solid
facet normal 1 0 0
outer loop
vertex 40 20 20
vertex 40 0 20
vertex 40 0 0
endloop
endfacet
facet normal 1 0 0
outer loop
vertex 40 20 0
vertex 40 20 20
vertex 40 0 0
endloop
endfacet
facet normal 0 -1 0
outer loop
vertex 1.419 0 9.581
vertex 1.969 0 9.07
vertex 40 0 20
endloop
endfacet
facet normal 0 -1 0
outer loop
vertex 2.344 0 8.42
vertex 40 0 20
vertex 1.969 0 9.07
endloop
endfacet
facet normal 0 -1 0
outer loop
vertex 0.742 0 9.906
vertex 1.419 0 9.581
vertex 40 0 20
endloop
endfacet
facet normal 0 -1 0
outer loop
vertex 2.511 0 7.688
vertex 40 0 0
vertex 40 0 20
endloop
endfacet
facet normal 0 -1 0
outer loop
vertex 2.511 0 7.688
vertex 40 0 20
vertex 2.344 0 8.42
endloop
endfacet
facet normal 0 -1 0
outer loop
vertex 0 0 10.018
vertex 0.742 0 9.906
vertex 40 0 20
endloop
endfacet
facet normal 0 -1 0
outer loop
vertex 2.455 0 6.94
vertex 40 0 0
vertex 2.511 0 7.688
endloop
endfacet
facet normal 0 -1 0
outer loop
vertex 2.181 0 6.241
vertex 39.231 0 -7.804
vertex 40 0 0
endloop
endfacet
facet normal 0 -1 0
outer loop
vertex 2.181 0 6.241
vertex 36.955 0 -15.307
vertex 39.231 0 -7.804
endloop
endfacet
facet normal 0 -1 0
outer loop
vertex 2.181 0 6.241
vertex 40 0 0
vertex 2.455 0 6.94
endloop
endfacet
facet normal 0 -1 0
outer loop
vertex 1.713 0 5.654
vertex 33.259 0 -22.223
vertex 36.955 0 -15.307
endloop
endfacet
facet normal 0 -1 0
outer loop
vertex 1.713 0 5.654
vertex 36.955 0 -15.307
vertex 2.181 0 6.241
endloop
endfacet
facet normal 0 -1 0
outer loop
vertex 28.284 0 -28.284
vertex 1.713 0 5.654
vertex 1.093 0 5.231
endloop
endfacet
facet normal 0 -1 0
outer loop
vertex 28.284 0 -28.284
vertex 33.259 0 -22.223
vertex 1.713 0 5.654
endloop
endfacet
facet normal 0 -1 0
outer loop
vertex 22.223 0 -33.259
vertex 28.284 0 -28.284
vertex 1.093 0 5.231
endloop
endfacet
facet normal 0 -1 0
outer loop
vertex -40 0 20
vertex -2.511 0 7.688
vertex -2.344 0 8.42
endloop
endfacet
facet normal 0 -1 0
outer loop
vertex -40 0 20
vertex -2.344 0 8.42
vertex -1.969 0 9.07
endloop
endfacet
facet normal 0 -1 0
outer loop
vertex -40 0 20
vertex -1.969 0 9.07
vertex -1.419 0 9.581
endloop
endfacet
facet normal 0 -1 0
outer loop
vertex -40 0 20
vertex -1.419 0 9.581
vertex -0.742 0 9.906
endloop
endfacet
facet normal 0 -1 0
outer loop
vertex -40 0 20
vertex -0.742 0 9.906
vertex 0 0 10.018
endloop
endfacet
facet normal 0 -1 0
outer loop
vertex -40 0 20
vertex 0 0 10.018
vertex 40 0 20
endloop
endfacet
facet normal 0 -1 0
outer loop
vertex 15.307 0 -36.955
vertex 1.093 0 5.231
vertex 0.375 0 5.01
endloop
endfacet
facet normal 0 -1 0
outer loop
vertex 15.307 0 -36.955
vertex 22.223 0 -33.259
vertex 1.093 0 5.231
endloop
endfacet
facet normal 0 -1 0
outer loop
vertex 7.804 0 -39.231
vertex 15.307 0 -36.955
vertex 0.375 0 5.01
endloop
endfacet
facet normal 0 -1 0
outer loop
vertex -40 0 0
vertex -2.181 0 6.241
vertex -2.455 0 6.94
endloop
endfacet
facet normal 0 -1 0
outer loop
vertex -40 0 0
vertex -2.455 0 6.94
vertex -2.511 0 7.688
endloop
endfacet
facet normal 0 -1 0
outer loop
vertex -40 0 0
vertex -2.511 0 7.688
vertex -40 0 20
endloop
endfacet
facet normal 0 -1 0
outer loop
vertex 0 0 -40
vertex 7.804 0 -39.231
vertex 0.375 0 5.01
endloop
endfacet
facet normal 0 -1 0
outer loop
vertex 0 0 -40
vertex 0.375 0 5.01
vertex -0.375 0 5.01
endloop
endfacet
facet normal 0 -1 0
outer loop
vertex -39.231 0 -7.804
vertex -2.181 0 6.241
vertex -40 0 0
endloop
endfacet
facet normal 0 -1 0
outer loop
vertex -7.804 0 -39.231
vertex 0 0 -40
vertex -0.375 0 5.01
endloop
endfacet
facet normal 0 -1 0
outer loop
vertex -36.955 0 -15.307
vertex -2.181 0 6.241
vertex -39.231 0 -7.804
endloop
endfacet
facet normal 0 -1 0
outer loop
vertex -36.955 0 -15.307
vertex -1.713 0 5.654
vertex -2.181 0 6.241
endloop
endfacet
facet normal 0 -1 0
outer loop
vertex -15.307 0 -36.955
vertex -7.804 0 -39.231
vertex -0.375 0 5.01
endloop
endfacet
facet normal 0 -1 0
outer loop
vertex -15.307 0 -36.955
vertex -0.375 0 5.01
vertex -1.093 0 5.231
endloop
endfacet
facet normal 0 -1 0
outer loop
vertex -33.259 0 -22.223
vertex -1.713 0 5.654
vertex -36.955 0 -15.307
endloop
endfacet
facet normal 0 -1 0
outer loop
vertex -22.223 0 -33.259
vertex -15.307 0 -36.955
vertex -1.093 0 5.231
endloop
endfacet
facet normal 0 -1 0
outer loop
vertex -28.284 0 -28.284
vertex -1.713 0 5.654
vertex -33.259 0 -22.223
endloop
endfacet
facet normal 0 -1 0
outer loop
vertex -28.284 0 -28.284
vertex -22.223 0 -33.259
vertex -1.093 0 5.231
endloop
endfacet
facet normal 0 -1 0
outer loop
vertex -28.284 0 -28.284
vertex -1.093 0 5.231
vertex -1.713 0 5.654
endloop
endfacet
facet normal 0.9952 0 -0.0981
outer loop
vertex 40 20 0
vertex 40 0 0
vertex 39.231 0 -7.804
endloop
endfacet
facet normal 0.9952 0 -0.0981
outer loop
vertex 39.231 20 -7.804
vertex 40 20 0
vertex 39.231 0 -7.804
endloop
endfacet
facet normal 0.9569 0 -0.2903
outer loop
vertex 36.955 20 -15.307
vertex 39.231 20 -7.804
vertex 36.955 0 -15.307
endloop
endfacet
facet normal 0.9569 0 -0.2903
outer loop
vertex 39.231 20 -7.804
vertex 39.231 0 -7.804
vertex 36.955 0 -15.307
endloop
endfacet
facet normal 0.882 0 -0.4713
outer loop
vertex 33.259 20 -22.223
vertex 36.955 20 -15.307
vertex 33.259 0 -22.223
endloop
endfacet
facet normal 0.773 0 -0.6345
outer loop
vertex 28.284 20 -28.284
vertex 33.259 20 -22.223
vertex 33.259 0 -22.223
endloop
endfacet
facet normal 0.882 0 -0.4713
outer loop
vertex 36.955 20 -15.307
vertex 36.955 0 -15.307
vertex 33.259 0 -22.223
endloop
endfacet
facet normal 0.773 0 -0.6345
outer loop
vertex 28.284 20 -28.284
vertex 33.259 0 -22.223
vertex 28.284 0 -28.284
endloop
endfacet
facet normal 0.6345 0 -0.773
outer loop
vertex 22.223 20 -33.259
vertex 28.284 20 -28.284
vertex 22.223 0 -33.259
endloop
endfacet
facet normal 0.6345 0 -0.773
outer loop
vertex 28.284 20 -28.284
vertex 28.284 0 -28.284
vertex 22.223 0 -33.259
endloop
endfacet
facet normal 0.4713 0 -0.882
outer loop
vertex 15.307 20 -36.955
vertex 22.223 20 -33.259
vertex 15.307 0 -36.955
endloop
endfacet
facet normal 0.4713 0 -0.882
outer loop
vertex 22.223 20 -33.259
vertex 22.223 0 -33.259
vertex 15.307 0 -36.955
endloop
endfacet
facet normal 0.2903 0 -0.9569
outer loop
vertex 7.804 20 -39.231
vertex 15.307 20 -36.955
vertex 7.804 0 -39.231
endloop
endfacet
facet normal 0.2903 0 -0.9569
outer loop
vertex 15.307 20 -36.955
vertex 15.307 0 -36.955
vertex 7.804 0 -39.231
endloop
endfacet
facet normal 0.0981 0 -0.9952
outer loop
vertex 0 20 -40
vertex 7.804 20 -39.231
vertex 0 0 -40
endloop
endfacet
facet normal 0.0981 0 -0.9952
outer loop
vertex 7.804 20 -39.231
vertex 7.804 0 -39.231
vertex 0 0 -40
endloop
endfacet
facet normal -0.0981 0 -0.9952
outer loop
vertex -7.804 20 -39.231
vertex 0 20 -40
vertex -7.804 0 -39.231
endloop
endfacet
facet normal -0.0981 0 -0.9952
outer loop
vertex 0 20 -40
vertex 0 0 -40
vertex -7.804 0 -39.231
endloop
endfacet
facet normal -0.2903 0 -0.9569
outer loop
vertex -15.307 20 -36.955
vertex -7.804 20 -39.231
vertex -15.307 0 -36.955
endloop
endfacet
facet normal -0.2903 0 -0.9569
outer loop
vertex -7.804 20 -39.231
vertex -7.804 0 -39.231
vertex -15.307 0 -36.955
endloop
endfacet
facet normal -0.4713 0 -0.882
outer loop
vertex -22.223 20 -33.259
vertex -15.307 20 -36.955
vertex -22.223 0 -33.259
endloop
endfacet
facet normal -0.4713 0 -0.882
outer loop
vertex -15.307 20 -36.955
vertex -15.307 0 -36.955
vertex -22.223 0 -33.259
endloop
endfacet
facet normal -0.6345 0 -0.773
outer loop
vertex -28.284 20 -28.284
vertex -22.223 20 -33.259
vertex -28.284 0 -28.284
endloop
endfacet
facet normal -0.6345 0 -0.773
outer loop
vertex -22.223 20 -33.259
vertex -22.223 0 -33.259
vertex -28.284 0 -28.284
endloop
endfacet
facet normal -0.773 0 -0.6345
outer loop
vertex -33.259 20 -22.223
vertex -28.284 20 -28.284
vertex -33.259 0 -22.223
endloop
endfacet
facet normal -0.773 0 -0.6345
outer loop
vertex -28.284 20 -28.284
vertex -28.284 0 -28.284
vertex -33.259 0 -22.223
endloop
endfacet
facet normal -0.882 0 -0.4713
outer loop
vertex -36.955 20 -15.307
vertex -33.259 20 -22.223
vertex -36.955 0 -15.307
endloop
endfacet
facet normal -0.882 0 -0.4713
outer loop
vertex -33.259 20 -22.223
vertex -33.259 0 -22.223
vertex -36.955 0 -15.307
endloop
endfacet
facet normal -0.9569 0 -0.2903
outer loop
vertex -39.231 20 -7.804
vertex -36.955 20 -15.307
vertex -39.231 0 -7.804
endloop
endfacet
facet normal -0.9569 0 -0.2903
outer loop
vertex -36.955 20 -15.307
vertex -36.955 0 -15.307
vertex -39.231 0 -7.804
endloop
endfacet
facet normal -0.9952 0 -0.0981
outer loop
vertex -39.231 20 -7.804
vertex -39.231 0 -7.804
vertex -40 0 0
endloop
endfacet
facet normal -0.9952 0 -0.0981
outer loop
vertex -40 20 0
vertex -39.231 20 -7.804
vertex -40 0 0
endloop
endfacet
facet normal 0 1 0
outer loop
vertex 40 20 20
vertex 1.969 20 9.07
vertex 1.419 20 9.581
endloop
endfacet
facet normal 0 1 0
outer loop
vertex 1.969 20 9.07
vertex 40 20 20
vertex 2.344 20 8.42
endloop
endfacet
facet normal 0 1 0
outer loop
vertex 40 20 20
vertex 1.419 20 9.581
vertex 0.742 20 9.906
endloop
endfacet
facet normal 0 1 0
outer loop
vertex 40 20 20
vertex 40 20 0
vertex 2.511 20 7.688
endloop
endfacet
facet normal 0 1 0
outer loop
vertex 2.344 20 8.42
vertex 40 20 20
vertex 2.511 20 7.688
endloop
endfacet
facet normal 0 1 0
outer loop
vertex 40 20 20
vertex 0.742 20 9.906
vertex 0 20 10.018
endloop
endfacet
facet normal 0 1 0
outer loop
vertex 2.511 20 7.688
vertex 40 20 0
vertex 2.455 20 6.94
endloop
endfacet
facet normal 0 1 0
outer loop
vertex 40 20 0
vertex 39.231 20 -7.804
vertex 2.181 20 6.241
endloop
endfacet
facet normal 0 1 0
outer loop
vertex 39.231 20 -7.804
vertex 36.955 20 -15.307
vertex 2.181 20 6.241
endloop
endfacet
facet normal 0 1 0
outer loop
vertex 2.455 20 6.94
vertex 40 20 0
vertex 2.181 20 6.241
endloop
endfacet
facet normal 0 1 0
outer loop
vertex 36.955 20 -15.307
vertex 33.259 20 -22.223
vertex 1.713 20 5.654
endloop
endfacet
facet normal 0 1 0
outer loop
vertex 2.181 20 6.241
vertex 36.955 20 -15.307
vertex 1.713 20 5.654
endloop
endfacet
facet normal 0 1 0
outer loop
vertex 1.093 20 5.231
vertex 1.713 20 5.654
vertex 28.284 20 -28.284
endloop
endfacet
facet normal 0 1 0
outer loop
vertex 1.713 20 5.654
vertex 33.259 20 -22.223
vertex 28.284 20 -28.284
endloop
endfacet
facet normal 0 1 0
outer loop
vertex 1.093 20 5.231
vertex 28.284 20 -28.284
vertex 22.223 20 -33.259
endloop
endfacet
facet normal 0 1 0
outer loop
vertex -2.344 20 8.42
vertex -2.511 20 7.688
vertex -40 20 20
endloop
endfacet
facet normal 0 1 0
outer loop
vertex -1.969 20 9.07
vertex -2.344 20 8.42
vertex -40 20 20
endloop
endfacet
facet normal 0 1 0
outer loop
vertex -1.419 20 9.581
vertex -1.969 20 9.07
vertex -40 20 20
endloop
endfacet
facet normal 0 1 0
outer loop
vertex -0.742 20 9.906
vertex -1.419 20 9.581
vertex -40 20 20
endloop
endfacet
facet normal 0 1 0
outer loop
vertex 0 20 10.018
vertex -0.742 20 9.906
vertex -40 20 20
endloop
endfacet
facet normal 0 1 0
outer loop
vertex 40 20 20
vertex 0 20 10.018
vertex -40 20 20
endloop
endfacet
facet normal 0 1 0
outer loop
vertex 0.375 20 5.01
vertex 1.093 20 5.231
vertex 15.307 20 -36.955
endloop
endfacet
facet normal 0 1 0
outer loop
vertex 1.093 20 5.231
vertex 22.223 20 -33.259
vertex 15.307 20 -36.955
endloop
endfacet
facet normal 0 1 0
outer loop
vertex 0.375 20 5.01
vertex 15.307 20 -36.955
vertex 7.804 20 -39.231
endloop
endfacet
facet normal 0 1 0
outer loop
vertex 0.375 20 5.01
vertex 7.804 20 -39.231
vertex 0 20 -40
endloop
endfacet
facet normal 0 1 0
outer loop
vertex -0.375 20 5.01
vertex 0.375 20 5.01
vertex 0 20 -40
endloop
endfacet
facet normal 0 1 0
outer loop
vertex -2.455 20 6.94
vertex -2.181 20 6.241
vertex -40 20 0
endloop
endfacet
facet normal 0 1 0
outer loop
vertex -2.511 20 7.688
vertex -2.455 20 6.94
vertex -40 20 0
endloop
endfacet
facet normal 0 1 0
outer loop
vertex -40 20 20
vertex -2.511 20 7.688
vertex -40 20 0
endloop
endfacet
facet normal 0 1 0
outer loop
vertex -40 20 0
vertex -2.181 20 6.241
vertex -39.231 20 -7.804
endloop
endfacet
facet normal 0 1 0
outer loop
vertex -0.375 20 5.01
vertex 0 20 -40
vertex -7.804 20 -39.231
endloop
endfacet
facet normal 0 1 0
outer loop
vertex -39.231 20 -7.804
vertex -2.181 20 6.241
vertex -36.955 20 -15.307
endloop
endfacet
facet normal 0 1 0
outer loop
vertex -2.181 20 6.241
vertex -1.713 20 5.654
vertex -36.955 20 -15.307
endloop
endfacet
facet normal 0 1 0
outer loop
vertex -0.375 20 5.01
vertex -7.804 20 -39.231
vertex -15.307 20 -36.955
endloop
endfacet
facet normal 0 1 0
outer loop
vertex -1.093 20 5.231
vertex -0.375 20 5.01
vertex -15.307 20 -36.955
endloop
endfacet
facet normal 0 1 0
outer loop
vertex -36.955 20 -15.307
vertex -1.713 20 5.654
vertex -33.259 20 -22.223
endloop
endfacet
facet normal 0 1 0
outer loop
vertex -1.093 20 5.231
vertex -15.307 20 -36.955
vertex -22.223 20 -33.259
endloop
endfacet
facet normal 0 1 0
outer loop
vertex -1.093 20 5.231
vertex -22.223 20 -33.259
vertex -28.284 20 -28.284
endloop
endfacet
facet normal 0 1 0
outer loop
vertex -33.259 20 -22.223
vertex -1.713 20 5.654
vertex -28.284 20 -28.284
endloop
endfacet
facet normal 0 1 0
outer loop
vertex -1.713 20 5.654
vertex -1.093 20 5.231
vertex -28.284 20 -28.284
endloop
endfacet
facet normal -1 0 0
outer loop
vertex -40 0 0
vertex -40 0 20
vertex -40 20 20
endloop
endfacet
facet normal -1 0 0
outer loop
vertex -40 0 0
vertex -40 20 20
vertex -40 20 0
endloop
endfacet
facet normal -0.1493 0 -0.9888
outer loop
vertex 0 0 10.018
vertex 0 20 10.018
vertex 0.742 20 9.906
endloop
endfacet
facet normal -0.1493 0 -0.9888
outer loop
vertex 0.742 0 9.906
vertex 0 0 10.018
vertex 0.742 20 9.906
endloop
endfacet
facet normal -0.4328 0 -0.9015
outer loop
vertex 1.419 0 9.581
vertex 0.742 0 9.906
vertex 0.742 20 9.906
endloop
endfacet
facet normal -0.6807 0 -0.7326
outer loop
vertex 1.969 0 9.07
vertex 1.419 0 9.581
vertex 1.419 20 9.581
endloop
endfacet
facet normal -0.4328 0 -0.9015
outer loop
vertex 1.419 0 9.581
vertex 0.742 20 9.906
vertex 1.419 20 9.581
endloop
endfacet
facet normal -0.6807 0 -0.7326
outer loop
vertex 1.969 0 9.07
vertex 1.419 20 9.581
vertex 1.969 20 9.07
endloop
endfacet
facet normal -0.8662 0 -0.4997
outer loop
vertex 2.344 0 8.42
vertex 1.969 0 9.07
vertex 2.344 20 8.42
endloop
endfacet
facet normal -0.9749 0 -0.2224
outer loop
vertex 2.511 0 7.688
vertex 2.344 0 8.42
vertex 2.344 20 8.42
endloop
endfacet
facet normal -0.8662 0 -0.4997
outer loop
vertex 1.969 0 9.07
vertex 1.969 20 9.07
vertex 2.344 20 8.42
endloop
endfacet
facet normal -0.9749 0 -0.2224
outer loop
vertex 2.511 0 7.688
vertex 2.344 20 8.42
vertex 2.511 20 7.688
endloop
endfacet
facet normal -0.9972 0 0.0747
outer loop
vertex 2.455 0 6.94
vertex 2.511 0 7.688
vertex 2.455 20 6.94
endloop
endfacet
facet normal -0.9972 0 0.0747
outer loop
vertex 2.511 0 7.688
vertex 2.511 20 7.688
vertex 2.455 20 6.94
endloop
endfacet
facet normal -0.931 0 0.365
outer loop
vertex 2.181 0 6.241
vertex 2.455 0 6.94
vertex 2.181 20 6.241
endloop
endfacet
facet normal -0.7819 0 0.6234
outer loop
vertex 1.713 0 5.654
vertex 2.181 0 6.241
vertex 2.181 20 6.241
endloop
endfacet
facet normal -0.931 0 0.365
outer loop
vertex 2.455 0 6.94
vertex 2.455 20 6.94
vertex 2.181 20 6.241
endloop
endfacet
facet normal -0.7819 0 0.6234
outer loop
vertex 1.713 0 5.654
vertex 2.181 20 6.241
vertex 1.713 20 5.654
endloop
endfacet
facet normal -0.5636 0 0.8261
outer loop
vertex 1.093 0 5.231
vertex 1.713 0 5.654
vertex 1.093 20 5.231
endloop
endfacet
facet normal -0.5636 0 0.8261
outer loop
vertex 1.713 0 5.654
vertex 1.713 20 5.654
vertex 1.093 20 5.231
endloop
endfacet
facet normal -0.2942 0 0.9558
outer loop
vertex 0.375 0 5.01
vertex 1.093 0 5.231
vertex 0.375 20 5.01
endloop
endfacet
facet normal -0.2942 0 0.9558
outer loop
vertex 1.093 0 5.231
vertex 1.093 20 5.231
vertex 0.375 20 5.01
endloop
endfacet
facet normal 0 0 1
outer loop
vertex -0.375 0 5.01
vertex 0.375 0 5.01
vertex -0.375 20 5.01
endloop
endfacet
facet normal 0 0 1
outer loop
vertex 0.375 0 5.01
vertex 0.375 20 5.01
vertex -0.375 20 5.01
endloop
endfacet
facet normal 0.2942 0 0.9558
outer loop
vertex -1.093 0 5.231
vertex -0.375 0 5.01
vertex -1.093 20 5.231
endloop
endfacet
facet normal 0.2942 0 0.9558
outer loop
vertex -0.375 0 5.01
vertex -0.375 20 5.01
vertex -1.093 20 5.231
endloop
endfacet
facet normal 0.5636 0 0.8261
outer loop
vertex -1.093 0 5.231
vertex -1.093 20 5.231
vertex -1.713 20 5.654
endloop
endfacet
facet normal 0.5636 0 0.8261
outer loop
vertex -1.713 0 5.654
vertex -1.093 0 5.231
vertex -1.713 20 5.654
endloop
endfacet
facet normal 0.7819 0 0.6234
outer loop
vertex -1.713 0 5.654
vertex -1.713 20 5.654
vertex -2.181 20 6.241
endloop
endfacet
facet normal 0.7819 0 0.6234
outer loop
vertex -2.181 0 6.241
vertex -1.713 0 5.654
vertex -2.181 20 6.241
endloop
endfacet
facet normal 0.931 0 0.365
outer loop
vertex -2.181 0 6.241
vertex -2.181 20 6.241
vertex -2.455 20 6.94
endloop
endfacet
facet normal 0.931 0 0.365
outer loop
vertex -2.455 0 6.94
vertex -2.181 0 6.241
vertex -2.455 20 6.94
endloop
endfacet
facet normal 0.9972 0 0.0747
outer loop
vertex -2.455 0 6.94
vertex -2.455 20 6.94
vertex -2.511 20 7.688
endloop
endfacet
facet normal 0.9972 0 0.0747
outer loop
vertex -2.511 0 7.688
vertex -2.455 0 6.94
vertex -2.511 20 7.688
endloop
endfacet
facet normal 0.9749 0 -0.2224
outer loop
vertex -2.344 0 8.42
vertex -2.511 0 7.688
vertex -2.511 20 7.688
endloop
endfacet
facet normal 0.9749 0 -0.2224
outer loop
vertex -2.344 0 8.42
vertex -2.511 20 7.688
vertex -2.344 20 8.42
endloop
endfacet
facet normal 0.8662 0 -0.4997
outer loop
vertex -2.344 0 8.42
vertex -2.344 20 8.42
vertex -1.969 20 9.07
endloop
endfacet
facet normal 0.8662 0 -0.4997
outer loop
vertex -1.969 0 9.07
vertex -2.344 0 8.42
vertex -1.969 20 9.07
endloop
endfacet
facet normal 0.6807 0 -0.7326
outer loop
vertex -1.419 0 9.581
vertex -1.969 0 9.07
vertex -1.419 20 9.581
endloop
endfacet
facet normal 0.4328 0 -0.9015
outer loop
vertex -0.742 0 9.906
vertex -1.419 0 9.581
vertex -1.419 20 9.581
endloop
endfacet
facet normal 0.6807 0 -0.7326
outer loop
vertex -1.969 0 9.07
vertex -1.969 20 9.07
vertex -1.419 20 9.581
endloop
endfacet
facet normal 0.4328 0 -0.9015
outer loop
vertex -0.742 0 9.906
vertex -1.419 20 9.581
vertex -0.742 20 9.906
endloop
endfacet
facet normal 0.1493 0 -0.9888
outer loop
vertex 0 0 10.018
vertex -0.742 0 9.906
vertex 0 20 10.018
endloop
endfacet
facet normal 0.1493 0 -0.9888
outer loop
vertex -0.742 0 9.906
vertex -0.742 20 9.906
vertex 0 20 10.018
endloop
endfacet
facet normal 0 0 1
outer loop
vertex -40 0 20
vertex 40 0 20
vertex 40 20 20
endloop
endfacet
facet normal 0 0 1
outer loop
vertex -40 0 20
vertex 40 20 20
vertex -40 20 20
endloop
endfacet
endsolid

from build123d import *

# Parameters (mm, degrees)
BOSS_EXTRUDE1_DEPTH = 20
SKETCH3_W           = 80
SKETCH3_H           = 15
BOSS_EXTRUDE3_DEPTH = 20
SKETCH4_R           = 1.75
CUT_EXTRUDE1_DEPTH  = 20
SKETCH6_W           = 80
SKETCH6_H           = 5
BOSS_EXTRUDE4_DEPTH = 20
SKETCH7_R           = 2.518213347
CUT_EXTRUDE3_DEPTH  = 20


with BuildPart() as part:
    # Sketch1 → Boss-Extrude1 (new body)
    with BuildSketch(Plane(origin=(0, 0, 0), x_dir=(1, 0, 0), z_dir=(0, 1, 0))):
        with BuildLine():
            Line((-40, 0), (40, 0))
            ThreePointArc((40, 0), (0, 40), (-40, 0))
        make_face()
    extrude(amount=BOSS_EXTRUDE1_DEPTH)

    # Sketch3 → Boss-Extrude3 (add)
    with BuildSketch(Plane(origin=(0, 20, 0), x_dir=(1, 0, 0), z_dir=(0, 1, 0))):
        with Locations((0, -7.5)):
            Rectangle(SKETCH3_W, SKETCH3_H)
    extrude(amount=-BOSS_EXTRUDE3_DEPTH)

    # Sketch4 → Cut-Extrude1 (cut)
    with BuildSketch(Plane(origin=(0, 0, 0), x_dir=(-1, 0, 0), z_dir=(0, -1, 0))):
        with Locations(Location((0, -7.5, 0), (0, 0, 90))):
            Circle(SKETCH4_R)
    extrude(amount=-CUT_EXTRUDE1_DEPTH, mode=Mode.SUBTRACT)

    # Sketch6 → Boss-Extrude4 (add)
    with BuildSketch(Plane(origin=(0, 0, 0), x_dir=(-1, 0, 0), z_dir=(0, -1, 0))):
        with Locations((0, -17.5)):
            Rectangle(SKETCH6_W, SKETCH6_H)
    extrude(amount=-BOSS_EXTRUDE4_DEPTH)

    # Sketch7 → Cut-Extrude3 (cut)
    with BuildSketch(Plane(origin=(0, 20, 0), x_dir=(1, 0, 0), z_dir=(0, 1, 0))):
        with Locations(Location((0, -7.5, 0), (0, 0, 270))):
            Circle(SKETCH7_R)
    extrude(amount=-CUT_EXTRUDE3_DEPTH, mode=Mode.SUBTRACT)


solid = part.part
